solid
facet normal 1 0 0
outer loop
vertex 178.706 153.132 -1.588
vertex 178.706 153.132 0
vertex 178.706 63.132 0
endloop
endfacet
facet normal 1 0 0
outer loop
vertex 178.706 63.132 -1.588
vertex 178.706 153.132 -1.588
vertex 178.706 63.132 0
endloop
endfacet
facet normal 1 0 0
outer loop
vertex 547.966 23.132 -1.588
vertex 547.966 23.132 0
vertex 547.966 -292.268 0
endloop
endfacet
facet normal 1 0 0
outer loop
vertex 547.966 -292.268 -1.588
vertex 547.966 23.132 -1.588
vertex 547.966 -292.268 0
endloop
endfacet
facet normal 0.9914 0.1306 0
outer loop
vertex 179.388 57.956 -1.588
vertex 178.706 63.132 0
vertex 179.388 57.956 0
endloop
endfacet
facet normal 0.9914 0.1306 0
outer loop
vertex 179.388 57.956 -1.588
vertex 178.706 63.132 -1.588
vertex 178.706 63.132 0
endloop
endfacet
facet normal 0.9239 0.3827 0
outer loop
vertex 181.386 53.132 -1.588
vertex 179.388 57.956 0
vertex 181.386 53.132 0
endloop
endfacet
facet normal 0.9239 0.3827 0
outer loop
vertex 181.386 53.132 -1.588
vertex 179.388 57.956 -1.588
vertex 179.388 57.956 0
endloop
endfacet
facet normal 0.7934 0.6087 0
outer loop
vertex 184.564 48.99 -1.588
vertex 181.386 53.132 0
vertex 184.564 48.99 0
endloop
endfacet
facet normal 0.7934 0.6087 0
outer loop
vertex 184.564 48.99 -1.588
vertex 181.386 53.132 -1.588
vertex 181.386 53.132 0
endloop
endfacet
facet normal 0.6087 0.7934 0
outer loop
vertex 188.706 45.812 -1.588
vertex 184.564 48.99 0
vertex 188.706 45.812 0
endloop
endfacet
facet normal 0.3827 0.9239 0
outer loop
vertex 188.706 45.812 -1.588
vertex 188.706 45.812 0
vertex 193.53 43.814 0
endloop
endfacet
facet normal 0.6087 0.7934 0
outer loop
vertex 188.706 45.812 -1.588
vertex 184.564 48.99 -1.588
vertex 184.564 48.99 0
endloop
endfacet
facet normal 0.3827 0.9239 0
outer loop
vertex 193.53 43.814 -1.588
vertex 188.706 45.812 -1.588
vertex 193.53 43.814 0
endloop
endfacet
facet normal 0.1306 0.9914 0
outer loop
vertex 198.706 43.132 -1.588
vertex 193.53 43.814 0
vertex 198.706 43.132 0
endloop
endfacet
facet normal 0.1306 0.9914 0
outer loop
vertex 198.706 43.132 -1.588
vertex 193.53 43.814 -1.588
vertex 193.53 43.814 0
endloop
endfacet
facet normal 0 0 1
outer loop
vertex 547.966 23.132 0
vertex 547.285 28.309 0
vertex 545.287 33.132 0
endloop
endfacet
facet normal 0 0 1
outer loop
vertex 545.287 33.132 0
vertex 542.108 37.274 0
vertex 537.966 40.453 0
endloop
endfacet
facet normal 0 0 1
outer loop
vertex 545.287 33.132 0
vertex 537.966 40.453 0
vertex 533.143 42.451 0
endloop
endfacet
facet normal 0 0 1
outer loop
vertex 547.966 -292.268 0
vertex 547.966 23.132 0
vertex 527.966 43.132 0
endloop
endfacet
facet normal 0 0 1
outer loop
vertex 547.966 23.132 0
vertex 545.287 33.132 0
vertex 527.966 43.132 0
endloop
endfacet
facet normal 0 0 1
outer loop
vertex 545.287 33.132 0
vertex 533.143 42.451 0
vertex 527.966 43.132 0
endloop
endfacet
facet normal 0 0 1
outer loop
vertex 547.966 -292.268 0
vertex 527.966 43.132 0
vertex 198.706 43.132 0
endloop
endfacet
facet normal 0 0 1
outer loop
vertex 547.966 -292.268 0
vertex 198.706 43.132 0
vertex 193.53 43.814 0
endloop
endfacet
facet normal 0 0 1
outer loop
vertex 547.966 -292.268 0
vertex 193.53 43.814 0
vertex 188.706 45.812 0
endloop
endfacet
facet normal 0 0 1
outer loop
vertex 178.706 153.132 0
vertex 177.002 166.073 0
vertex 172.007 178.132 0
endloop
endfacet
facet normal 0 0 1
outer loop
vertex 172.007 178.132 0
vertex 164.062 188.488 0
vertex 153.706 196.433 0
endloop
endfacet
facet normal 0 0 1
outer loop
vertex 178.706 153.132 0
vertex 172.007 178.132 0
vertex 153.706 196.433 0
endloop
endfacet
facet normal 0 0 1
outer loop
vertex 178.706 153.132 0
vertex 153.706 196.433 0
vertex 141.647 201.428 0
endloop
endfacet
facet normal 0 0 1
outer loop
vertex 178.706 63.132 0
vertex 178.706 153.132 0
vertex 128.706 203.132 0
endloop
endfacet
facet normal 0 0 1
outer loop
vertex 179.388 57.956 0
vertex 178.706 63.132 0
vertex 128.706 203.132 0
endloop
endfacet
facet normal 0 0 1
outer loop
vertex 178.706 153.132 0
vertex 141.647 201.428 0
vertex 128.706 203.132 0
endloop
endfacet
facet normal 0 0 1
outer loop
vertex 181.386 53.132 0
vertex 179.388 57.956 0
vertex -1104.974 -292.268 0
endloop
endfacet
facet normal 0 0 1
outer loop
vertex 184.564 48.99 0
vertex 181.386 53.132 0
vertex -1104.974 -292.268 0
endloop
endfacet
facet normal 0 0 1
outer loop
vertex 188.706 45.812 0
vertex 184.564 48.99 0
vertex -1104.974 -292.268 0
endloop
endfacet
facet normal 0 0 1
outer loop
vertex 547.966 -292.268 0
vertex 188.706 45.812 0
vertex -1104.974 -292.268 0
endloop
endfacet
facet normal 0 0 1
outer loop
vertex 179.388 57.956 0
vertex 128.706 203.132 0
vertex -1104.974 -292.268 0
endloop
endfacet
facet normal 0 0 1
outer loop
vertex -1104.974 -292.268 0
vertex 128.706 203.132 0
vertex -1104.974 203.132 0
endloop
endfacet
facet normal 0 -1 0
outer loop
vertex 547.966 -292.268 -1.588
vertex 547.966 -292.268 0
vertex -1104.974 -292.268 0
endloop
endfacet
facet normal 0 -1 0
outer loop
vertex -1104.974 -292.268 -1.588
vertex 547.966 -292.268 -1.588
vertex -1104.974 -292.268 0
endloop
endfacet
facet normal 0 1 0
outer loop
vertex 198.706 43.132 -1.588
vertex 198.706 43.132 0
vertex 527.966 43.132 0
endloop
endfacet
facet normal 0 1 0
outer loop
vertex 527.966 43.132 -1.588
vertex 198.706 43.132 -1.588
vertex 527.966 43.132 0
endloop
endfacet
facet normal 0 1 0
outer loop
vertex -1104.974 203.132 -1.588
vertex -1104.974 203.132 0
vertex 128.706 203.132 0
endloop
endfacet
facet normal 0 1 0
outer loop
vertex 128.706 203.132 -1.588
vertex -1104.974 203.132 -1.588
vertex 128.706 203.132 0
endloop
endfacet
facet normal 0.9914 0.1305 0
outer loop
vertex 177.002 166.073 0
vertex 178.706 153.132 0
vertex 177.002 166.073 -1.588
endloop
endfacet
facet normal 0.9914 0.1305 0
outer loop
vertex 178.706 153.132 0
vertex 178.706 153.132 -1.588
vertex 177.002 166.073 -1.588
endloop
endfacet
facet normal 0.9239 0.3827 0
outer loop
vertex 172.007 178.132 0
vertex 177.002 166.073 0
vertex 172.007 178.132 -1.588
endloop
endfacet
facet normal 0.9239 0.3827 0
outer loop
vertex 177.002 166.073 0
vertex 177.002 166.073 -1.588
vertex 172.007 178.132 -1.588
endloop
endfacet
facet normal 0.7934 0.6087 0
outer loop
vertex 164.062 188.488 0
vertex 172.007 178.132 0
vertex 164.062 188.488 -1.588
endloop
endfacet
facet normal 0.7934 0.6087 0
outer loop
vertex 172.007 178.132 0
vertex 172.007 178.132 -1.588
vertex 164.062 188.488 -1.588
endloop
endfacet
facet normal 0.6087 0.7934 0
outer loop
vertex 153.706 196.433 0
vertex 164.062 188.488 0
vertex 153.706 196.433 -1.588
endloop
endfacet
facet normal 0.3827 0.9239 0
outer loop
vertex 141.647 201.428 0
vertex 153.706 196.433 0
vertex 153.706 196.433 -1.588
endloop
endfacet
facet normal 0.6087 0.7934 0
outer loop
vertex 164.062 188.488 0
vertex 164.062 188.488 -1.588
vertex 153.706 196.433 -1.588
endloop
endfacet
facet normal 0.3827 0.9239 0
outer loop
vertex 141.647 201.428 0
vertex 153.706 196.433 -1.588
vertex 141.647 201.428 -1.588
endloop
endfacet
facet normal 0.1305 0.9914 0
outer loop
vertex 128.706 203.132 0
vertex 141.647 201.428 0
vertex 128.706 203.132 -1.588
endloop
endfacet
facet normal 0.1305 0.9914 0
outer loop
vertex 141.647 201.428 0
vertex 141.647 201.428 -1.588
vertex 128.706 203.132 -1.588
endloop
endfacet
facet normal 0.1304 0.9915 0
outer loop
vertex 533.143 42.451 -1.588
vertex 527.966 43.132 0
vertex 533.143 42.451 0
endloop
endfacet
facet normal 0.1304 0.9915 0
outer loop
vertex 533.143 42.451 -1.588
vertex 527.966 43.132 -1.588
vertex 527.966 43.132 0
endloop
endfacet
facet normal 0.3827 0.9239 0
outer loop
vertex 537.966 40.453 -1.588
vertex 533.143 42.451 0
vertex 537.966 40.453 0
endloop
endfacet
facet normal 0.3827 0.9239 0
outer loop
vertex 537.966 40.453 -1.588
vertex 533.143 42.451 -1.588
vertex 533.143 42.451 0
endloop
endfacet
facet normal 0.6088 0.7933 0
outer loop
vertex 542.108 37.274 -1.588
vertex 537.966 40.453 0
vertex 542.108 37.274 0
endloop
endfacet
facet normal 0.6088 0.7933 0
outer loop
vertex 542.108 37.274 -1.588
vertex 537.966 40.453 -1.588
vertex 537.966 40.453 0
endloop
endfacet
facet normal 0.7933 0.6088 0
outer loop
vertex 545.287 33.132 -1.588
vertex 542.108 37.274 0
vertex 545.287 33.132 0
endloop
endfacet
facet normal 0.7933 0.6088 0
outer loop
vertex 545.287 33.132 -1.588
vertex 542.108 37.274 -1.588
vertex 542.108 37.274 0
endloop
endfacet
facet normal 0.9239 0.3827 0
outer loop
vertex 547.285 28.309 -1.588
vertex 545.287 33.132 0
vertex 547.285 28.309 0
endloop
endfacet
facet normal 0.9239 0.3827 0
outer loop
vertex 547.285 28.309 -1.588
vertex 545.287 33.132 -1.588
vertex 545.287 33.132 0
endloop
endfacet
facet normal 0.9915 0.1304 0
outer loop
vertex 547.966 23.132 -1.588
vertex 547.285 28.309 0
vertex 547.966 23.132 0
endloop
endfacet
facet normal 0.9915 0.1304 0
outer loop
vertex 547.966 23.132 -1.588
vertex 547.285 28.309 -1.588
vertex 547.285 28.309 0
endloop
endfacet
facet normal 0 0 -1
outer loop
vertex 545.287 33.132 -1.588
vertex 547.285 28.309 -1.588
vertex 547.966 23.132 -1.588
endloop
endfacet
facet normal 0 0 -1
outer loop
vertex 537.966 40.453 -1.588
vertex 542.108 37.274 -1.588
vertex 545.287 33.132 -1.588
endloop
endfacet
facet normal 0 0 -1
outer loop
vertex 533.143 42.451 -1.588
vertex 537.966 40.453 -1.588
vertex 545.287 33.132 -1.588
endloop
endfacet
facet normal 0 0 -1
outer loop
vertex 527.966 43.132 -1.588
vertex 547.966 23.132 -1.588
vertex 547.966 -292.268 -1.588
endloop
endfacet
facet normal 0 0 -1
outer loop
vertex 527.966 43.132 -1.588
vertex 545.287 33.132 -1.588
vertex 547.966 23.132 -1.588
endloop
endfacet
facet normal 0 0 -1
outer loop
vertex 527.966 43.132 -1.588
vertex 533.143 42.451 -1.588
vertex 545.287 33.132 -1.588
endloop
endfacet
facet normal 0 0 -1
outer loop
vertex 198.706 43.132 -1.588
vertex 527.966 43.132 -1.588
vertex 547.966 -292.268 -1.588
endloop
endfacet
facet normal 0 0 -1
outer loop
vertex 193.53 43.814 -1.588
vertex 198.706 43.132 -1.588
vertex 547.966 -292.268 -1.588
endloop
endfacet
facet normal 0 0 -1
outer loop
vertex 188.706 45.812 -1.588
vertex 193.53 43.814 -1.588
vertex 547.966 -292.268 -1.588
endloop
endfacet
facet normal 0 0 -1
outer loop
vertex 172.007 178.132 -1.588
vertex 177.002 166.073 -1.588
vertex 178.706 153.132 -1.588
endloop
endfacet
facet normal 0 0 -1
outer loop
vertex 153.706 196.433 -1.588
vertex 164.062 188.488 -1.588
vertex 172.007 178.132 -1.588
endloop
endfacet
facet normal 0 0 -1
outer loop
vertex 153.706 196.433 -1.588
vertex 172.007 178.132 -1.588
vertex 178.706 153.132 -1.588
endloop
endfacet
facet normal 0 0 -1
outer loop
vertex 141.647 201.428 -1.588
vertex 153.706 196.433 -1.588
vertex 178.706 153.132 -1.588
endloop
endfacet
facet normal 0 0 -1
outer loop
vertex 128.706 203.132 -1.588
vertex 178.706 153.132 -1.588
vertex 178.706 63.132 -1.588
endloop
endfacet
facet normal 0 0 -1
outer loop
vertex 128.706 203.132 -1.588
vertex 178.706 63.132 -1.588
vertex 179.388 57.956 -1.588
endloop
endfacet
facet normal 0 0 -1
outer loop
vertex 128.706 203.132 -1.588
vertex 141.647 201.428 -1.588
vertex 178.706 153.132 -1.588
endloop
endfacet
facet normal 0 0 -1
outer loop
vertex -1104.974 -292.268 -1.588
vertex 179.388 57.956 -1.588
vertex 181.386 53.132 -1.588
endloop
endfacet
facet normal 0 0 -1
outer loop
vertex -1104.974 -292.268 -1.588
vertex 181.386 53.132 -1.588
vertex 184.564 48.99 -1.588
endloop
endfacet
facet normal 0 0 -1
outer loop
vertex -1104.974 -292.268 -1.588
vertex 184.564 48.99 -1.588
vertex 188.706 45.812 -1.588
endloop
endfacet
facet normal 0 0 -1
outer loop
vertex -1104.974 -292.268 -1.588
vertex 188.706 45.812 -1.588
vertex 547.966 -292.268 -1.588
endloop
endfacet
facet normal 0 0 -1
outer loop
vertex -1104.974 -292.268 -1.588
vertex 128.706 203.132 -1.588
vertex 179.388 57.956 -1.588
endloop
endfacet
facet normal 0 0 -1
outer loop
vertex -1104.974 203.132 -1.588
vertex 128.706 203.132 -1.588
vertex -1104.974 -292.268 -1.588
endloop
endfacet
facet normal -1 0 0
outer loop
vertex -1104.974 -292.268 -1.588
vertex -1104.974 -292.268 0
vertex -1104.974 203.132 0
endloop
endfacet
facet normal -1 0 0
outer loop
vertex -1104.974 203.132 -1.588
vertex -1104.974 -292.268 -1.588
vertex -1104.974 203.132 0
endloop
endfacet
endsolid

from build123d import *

# Parameters (mm, degrees)
BRIDA_BASE1_DEPTH = 1.5875
REDONDEO2_R       = 20
REDONDEO3_R       = 50
REDONDEO4_R       = 20


# Sheet-metal steps are written as plain solids
with BuildPart() as part:
    # Croquis1 → Brida base1 (new body)
    with BuildSketch(Plane.XY):
        Polygon((-1104.973795497, 203.132185629), (178.706204503, 203.132185629), (178.706204503, 43.132185629), (547.966204503, 43.132185629), (547.966204503, -292.267814371), (-1104.973795497, -292.267814371), align=None)
    extrude(amount=-BRIDA_BASE1_DEPTH)

    # Redondeo2
    redondeo2_edges = [part.edges().sort_by_distance(p)[0] for p in [
        (178.706204503, 43.132185629, -0.79375),
    ]]
    fillet(redondeo2_edges, radius=REDONDEO2_R)

    # Redondeo3
    redondeo3_edges = [part.edges().sort_by_distance(p)[0] for p in [
        (178.706204503, 203.132185629, -0.79375),
    ]]
    fillet(redondeo3_edges, radius=REDONDEO3_R)

    # Redondeo4
    redondeo4_edges = [part.edges().sort_by_distance(p)[0] for p in [
        (547.966204503, 43.132185629, -0.79375),
    ]]
    fillet(redondeo4_edges, radius=REDONDEO4_R)


solid = part.part
